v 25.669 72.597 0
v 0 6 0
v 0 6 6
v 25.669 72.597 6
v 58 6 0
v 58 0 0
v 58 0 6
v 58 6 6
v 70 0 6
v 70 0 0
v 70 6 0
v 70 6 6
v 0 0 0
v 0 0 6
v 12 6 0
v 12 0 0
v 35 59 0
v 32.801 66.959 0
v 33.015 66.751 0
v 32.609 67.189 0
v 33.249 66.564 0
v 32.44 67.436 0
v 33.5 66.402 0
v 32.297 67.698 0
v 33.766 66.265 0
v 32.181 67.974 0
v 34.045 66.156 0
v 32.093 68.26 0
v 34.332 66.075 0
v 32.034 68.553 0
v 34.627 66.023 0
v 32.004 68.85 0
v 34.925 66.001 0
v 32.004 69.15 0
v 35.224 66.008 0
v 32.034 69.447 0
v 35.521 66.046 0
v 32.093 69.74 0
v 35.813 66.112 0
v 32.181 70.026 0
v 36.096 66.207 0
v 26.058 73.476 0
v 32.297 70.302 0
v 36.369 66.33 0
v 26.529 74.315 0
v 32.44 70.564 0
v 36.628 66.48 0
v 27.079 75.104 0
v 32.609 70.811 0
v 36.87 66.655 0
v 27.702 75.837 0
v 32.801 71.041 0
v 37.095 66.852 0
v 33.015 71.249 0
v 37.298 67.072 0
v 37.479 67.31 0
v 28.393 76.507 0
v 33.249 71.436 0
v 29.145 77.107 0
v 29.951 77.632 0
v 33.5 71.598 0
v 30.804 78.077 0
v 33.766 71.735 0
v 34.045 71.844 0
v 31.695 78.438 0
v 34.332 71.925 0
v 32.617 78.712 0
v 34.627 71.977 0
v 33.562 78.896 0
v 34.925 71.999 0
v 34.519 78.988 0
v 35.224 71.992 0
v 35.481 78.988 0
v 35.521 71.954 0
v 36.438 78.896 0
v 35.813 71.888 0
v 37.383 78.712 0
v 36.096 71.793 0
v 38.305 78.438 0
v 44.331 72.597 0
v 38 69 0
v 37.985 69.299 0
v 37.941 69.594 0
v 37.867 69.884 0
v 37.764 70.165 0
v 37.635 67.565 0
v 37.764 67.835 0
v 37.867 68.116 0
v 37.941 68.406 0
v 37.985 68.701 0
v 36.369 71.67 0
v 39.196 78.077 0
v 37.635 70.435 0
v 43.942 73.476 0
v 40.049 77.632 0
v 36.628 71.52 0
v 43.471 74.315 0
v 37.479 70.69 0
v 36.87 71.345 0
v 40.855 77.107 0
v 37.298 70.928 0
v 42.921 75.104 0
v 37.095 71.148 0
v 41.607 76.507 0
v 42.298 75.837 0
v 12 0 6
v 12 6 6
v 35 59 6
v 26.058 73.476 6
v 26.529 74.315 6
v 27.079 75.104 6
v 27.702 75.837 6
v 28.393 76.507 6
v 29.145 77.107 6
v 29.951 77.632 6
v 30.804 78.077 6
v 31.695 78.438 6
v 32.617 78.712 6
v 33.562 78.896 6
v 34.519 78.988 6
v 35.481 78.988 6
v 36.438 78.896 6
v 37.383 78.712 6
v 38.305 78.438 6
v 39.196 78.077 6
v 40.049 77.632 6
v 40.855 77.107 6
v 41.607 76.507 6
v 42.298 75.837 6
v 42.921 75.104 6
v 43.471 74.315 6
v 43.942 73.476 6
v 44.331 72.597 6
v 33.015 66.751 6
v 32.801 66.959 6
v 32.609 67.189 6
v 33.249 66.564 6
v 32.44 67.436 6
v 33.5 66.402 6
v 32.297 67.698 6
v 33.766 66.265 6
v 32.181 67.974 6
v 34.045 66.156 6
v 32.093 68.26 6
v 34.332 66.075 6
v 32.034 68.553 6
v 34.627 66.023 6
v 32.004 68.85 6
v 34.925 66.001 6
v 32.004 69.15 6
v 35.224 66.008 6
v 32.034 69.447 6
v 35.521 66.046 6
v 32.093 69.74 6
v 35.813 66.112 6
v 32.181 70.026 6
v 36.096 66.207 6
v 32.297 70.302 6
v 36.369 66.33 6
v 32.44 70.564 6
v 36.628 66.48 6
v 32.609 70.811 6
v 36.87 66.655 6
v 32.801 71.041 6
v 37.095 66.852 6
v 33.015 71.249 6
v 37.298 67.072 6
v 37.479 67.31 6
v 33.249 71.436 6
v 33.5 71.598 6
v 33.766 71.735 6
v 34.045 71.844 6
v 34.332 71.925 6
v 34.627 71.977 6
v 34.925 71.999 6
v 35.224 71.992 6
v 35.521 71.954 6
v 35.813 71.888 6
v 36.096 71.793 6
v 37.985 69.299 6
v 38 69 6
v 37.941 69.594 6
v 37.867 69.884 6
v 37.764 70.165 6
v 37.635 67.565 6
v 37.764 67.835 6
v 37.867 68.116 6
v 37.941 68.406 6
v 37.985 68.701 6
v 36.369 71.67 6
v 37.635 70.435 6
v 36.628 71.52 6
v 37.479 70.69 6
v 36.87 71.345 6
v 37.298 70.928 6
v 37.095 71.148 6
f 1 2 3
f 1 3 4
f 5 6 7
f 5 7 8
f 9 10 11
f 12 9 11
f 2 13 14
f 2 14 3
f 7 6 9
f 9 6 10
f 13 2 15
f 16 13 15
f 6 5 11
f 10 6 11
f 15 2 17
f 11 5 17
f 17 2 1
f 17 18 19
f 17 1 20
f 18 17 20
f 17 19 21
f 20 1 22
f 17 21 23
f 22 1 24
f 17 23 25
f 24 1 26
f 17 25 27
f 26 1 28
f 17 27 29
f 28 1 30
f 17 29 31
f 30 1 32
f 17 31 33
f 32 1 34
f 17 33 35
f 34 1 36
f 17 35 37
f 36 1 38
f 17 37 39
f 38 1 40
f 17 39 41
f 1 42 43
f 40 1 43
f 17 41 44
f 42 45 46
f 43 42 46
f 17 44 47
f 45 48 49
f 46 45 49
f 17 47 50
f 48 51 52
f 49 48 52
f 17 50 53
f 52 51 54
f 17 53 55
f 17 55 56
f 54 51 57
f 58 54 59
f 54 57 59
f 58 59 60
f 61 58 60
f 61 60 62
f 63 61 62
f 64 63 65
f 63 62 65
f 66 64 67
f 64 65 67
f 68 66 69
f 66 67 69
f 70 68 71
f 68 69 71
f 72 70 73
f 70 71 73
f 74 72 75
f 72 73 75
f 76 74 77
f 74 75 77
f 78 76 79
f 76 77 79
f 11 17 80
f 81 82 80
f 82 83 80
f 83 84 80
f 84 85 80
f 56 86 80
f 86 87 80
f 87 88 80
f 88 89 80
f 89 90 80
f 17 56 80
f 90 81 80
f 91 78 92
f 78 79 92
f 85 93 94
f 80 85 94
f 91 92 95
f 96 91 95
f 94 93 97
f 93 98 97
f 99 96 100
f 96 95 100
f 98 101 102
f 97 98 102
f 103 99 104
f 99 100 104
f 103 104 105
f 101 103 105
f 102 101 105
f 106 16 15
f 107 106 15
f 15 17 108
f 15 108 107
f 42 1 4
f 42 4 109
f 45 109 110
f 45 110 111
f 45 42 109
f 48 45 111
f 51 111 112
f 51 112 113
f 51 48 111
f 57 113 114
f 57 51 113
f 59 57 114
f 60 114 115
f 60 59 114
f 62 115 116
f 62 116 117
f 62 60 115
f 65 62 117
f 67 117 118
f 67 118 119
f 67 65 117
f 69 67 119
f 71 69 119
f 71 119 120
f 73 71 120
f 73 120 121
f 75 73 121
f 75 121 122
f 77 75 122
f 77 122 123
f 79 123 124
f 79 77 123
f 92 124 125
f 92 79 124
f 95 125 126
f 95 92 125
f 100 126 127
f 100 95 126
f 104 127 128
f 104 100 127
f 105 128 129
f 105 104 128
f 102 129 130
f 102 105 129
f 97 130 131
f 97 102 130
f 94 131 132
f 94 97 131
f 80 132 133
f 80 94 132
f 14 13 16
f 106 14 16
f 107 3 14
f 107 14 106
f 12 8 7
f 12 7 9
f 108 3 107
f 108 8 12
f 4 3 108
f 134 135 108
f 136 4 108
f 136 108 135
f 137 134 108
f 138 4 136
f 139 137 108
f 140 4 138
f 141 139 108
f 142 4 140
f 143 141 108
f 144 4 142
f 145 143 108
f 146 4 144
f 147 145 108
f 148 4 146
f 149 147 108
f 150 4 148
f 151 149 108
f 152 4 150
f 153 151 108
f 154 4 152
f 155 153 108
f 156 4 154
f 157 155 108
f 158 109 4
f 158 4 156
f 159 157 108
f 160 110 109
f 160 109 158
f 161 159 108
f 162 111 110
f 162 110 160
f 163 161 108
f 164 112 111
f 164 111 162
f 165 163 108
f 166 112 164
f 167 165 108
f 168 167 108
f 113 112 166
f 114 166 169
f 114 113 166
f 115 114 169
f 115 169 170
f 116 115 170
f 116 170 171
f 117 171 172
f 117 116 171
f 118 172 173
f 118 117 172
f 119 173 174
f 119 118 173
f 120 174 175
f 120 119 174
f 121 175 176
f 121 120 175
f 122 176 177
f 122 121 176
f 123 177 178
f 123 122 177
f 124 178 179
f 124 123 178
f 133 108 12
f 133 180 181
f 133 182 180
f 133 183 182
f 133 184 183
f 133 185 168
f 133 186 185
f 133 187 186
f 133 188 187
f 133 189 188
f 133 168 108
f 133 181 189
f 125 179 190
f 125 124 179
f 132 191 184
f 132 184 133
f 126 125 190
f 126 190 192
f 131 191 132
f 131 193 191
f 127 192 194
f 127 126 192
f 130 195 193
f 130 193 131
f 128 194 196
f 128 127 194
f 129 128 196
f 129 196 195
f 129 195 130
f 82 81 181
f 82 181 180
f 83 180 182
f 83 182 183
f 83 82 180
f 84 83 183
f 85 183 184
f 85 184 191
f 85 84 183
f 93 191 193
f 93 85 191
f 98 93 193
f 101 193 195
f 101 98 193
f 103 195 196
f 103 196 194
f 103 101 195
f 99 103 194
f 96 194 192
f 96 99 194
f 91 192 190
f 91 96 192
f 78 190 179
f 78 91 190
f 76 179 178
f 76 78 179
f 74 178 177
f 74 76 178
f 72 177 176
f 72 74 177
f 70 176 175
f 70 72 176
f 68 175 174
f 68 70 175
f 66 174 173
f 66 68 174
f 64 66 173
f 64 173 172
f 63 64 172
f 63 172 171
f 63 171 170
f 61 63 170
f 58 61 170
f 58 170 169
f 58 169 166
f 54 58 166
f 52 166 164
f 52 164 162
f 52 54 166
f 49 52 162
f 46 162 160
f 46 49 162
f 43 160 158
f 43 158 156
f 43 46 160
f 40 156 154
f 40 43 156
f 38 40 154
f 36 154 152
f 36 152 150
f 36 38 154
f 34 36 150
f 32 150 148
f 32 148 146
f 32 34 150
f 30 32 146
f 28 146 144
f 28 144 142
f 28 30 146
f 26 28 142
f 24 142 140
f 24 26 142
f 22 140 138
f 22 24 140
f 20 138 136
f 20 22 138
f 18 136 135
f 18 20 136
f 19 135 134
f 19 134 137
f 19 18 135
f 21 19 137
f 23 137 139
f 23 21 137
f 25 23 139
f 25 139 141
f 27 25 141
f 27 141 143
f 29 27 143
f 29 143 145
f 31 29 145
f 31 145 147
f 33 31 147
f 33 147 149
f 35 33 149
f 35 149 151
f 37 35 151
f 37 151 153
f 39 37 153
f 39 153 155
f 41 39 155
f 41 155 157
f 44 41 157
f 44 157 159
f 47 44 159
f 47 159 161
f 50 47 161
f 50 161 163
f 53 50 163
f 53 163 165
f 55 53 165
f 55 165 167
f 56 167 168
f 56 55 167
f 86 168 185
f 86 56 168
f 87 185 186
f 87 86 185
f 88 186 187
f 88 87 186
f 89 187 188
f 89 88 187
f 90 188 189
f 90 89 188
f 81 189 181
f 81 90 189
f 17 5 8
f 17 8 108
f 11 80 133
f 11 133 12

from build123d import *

# Parameters (mm, degrees)
ESBO_O1_R                = 5
ESBO_O1_W                = 12
ESBO_O1_H                = 6
RESSALTO_EXTRUS_O1_DEPTH = 6
RESSALTO_EXTRUS_O2_START = -6
ESBO_O2_R                = 5
ESBO_O2_R_2              = 3
RESSALTO_EXTRUS_O2_DEPTH = 6


with BuildPart() as part:
    # Esboço1 → Ressalto-extrusão1 (new body)
    # profile 1 of 3: a face of its own
    with BuildSketch(Plane.XY):
        with BuildLine():
            ThreePointArc((25.669132457, 72.596513714), (35, 79), (44.330867543, 72.596513714))
            Line((44.330867543, 72.596513714), (70, 6))
            Line((70, 6), (58, 6))
            Line((58, 6), (35, 59))
            Line((35, 59), (12, 6))
            Line((12, 6), (0, 6))
            Line((0, 6), (25.669132457, 72.596513714))
        make_face()
        with Locations((35, 69)):
            Circle(ESBO_O1_R, mode=Mode.SUBTRACT)
    # profile 2 of 3: a face of its own
    with BuildSketch(Plane.XY):
        with Locations((6, 3)):
            Rectangle(ESBO_O1_W, ESBO_O1_H)
    # profile 3 of 3: a face of its own
    with BuildSketch(Plane.XY):
        with Locations((64, 3)):
            Rectangle(ESBO_O1_W, ESBO_O1_H)
    extrude(amount=RESSALTO_EXTRUS_O1_DEPTH)

    # Esboço2 → Ressalto-extrusão2 (add)
    with BuildSketch(Plane.XY.offset(6).offset(RESSALTO_EXTRUS_O2_START)):
        with Locations((35, 69)):
            Circle(ESBO_O2_R)
        with Locations((35, 69)):
            Circle(ESBO_O2_R_2, mode=Mode.SUBTRACT)
    extrude(amount=RESSALTO_EXTRUS_O2_DEPTH)


solid = part.part
